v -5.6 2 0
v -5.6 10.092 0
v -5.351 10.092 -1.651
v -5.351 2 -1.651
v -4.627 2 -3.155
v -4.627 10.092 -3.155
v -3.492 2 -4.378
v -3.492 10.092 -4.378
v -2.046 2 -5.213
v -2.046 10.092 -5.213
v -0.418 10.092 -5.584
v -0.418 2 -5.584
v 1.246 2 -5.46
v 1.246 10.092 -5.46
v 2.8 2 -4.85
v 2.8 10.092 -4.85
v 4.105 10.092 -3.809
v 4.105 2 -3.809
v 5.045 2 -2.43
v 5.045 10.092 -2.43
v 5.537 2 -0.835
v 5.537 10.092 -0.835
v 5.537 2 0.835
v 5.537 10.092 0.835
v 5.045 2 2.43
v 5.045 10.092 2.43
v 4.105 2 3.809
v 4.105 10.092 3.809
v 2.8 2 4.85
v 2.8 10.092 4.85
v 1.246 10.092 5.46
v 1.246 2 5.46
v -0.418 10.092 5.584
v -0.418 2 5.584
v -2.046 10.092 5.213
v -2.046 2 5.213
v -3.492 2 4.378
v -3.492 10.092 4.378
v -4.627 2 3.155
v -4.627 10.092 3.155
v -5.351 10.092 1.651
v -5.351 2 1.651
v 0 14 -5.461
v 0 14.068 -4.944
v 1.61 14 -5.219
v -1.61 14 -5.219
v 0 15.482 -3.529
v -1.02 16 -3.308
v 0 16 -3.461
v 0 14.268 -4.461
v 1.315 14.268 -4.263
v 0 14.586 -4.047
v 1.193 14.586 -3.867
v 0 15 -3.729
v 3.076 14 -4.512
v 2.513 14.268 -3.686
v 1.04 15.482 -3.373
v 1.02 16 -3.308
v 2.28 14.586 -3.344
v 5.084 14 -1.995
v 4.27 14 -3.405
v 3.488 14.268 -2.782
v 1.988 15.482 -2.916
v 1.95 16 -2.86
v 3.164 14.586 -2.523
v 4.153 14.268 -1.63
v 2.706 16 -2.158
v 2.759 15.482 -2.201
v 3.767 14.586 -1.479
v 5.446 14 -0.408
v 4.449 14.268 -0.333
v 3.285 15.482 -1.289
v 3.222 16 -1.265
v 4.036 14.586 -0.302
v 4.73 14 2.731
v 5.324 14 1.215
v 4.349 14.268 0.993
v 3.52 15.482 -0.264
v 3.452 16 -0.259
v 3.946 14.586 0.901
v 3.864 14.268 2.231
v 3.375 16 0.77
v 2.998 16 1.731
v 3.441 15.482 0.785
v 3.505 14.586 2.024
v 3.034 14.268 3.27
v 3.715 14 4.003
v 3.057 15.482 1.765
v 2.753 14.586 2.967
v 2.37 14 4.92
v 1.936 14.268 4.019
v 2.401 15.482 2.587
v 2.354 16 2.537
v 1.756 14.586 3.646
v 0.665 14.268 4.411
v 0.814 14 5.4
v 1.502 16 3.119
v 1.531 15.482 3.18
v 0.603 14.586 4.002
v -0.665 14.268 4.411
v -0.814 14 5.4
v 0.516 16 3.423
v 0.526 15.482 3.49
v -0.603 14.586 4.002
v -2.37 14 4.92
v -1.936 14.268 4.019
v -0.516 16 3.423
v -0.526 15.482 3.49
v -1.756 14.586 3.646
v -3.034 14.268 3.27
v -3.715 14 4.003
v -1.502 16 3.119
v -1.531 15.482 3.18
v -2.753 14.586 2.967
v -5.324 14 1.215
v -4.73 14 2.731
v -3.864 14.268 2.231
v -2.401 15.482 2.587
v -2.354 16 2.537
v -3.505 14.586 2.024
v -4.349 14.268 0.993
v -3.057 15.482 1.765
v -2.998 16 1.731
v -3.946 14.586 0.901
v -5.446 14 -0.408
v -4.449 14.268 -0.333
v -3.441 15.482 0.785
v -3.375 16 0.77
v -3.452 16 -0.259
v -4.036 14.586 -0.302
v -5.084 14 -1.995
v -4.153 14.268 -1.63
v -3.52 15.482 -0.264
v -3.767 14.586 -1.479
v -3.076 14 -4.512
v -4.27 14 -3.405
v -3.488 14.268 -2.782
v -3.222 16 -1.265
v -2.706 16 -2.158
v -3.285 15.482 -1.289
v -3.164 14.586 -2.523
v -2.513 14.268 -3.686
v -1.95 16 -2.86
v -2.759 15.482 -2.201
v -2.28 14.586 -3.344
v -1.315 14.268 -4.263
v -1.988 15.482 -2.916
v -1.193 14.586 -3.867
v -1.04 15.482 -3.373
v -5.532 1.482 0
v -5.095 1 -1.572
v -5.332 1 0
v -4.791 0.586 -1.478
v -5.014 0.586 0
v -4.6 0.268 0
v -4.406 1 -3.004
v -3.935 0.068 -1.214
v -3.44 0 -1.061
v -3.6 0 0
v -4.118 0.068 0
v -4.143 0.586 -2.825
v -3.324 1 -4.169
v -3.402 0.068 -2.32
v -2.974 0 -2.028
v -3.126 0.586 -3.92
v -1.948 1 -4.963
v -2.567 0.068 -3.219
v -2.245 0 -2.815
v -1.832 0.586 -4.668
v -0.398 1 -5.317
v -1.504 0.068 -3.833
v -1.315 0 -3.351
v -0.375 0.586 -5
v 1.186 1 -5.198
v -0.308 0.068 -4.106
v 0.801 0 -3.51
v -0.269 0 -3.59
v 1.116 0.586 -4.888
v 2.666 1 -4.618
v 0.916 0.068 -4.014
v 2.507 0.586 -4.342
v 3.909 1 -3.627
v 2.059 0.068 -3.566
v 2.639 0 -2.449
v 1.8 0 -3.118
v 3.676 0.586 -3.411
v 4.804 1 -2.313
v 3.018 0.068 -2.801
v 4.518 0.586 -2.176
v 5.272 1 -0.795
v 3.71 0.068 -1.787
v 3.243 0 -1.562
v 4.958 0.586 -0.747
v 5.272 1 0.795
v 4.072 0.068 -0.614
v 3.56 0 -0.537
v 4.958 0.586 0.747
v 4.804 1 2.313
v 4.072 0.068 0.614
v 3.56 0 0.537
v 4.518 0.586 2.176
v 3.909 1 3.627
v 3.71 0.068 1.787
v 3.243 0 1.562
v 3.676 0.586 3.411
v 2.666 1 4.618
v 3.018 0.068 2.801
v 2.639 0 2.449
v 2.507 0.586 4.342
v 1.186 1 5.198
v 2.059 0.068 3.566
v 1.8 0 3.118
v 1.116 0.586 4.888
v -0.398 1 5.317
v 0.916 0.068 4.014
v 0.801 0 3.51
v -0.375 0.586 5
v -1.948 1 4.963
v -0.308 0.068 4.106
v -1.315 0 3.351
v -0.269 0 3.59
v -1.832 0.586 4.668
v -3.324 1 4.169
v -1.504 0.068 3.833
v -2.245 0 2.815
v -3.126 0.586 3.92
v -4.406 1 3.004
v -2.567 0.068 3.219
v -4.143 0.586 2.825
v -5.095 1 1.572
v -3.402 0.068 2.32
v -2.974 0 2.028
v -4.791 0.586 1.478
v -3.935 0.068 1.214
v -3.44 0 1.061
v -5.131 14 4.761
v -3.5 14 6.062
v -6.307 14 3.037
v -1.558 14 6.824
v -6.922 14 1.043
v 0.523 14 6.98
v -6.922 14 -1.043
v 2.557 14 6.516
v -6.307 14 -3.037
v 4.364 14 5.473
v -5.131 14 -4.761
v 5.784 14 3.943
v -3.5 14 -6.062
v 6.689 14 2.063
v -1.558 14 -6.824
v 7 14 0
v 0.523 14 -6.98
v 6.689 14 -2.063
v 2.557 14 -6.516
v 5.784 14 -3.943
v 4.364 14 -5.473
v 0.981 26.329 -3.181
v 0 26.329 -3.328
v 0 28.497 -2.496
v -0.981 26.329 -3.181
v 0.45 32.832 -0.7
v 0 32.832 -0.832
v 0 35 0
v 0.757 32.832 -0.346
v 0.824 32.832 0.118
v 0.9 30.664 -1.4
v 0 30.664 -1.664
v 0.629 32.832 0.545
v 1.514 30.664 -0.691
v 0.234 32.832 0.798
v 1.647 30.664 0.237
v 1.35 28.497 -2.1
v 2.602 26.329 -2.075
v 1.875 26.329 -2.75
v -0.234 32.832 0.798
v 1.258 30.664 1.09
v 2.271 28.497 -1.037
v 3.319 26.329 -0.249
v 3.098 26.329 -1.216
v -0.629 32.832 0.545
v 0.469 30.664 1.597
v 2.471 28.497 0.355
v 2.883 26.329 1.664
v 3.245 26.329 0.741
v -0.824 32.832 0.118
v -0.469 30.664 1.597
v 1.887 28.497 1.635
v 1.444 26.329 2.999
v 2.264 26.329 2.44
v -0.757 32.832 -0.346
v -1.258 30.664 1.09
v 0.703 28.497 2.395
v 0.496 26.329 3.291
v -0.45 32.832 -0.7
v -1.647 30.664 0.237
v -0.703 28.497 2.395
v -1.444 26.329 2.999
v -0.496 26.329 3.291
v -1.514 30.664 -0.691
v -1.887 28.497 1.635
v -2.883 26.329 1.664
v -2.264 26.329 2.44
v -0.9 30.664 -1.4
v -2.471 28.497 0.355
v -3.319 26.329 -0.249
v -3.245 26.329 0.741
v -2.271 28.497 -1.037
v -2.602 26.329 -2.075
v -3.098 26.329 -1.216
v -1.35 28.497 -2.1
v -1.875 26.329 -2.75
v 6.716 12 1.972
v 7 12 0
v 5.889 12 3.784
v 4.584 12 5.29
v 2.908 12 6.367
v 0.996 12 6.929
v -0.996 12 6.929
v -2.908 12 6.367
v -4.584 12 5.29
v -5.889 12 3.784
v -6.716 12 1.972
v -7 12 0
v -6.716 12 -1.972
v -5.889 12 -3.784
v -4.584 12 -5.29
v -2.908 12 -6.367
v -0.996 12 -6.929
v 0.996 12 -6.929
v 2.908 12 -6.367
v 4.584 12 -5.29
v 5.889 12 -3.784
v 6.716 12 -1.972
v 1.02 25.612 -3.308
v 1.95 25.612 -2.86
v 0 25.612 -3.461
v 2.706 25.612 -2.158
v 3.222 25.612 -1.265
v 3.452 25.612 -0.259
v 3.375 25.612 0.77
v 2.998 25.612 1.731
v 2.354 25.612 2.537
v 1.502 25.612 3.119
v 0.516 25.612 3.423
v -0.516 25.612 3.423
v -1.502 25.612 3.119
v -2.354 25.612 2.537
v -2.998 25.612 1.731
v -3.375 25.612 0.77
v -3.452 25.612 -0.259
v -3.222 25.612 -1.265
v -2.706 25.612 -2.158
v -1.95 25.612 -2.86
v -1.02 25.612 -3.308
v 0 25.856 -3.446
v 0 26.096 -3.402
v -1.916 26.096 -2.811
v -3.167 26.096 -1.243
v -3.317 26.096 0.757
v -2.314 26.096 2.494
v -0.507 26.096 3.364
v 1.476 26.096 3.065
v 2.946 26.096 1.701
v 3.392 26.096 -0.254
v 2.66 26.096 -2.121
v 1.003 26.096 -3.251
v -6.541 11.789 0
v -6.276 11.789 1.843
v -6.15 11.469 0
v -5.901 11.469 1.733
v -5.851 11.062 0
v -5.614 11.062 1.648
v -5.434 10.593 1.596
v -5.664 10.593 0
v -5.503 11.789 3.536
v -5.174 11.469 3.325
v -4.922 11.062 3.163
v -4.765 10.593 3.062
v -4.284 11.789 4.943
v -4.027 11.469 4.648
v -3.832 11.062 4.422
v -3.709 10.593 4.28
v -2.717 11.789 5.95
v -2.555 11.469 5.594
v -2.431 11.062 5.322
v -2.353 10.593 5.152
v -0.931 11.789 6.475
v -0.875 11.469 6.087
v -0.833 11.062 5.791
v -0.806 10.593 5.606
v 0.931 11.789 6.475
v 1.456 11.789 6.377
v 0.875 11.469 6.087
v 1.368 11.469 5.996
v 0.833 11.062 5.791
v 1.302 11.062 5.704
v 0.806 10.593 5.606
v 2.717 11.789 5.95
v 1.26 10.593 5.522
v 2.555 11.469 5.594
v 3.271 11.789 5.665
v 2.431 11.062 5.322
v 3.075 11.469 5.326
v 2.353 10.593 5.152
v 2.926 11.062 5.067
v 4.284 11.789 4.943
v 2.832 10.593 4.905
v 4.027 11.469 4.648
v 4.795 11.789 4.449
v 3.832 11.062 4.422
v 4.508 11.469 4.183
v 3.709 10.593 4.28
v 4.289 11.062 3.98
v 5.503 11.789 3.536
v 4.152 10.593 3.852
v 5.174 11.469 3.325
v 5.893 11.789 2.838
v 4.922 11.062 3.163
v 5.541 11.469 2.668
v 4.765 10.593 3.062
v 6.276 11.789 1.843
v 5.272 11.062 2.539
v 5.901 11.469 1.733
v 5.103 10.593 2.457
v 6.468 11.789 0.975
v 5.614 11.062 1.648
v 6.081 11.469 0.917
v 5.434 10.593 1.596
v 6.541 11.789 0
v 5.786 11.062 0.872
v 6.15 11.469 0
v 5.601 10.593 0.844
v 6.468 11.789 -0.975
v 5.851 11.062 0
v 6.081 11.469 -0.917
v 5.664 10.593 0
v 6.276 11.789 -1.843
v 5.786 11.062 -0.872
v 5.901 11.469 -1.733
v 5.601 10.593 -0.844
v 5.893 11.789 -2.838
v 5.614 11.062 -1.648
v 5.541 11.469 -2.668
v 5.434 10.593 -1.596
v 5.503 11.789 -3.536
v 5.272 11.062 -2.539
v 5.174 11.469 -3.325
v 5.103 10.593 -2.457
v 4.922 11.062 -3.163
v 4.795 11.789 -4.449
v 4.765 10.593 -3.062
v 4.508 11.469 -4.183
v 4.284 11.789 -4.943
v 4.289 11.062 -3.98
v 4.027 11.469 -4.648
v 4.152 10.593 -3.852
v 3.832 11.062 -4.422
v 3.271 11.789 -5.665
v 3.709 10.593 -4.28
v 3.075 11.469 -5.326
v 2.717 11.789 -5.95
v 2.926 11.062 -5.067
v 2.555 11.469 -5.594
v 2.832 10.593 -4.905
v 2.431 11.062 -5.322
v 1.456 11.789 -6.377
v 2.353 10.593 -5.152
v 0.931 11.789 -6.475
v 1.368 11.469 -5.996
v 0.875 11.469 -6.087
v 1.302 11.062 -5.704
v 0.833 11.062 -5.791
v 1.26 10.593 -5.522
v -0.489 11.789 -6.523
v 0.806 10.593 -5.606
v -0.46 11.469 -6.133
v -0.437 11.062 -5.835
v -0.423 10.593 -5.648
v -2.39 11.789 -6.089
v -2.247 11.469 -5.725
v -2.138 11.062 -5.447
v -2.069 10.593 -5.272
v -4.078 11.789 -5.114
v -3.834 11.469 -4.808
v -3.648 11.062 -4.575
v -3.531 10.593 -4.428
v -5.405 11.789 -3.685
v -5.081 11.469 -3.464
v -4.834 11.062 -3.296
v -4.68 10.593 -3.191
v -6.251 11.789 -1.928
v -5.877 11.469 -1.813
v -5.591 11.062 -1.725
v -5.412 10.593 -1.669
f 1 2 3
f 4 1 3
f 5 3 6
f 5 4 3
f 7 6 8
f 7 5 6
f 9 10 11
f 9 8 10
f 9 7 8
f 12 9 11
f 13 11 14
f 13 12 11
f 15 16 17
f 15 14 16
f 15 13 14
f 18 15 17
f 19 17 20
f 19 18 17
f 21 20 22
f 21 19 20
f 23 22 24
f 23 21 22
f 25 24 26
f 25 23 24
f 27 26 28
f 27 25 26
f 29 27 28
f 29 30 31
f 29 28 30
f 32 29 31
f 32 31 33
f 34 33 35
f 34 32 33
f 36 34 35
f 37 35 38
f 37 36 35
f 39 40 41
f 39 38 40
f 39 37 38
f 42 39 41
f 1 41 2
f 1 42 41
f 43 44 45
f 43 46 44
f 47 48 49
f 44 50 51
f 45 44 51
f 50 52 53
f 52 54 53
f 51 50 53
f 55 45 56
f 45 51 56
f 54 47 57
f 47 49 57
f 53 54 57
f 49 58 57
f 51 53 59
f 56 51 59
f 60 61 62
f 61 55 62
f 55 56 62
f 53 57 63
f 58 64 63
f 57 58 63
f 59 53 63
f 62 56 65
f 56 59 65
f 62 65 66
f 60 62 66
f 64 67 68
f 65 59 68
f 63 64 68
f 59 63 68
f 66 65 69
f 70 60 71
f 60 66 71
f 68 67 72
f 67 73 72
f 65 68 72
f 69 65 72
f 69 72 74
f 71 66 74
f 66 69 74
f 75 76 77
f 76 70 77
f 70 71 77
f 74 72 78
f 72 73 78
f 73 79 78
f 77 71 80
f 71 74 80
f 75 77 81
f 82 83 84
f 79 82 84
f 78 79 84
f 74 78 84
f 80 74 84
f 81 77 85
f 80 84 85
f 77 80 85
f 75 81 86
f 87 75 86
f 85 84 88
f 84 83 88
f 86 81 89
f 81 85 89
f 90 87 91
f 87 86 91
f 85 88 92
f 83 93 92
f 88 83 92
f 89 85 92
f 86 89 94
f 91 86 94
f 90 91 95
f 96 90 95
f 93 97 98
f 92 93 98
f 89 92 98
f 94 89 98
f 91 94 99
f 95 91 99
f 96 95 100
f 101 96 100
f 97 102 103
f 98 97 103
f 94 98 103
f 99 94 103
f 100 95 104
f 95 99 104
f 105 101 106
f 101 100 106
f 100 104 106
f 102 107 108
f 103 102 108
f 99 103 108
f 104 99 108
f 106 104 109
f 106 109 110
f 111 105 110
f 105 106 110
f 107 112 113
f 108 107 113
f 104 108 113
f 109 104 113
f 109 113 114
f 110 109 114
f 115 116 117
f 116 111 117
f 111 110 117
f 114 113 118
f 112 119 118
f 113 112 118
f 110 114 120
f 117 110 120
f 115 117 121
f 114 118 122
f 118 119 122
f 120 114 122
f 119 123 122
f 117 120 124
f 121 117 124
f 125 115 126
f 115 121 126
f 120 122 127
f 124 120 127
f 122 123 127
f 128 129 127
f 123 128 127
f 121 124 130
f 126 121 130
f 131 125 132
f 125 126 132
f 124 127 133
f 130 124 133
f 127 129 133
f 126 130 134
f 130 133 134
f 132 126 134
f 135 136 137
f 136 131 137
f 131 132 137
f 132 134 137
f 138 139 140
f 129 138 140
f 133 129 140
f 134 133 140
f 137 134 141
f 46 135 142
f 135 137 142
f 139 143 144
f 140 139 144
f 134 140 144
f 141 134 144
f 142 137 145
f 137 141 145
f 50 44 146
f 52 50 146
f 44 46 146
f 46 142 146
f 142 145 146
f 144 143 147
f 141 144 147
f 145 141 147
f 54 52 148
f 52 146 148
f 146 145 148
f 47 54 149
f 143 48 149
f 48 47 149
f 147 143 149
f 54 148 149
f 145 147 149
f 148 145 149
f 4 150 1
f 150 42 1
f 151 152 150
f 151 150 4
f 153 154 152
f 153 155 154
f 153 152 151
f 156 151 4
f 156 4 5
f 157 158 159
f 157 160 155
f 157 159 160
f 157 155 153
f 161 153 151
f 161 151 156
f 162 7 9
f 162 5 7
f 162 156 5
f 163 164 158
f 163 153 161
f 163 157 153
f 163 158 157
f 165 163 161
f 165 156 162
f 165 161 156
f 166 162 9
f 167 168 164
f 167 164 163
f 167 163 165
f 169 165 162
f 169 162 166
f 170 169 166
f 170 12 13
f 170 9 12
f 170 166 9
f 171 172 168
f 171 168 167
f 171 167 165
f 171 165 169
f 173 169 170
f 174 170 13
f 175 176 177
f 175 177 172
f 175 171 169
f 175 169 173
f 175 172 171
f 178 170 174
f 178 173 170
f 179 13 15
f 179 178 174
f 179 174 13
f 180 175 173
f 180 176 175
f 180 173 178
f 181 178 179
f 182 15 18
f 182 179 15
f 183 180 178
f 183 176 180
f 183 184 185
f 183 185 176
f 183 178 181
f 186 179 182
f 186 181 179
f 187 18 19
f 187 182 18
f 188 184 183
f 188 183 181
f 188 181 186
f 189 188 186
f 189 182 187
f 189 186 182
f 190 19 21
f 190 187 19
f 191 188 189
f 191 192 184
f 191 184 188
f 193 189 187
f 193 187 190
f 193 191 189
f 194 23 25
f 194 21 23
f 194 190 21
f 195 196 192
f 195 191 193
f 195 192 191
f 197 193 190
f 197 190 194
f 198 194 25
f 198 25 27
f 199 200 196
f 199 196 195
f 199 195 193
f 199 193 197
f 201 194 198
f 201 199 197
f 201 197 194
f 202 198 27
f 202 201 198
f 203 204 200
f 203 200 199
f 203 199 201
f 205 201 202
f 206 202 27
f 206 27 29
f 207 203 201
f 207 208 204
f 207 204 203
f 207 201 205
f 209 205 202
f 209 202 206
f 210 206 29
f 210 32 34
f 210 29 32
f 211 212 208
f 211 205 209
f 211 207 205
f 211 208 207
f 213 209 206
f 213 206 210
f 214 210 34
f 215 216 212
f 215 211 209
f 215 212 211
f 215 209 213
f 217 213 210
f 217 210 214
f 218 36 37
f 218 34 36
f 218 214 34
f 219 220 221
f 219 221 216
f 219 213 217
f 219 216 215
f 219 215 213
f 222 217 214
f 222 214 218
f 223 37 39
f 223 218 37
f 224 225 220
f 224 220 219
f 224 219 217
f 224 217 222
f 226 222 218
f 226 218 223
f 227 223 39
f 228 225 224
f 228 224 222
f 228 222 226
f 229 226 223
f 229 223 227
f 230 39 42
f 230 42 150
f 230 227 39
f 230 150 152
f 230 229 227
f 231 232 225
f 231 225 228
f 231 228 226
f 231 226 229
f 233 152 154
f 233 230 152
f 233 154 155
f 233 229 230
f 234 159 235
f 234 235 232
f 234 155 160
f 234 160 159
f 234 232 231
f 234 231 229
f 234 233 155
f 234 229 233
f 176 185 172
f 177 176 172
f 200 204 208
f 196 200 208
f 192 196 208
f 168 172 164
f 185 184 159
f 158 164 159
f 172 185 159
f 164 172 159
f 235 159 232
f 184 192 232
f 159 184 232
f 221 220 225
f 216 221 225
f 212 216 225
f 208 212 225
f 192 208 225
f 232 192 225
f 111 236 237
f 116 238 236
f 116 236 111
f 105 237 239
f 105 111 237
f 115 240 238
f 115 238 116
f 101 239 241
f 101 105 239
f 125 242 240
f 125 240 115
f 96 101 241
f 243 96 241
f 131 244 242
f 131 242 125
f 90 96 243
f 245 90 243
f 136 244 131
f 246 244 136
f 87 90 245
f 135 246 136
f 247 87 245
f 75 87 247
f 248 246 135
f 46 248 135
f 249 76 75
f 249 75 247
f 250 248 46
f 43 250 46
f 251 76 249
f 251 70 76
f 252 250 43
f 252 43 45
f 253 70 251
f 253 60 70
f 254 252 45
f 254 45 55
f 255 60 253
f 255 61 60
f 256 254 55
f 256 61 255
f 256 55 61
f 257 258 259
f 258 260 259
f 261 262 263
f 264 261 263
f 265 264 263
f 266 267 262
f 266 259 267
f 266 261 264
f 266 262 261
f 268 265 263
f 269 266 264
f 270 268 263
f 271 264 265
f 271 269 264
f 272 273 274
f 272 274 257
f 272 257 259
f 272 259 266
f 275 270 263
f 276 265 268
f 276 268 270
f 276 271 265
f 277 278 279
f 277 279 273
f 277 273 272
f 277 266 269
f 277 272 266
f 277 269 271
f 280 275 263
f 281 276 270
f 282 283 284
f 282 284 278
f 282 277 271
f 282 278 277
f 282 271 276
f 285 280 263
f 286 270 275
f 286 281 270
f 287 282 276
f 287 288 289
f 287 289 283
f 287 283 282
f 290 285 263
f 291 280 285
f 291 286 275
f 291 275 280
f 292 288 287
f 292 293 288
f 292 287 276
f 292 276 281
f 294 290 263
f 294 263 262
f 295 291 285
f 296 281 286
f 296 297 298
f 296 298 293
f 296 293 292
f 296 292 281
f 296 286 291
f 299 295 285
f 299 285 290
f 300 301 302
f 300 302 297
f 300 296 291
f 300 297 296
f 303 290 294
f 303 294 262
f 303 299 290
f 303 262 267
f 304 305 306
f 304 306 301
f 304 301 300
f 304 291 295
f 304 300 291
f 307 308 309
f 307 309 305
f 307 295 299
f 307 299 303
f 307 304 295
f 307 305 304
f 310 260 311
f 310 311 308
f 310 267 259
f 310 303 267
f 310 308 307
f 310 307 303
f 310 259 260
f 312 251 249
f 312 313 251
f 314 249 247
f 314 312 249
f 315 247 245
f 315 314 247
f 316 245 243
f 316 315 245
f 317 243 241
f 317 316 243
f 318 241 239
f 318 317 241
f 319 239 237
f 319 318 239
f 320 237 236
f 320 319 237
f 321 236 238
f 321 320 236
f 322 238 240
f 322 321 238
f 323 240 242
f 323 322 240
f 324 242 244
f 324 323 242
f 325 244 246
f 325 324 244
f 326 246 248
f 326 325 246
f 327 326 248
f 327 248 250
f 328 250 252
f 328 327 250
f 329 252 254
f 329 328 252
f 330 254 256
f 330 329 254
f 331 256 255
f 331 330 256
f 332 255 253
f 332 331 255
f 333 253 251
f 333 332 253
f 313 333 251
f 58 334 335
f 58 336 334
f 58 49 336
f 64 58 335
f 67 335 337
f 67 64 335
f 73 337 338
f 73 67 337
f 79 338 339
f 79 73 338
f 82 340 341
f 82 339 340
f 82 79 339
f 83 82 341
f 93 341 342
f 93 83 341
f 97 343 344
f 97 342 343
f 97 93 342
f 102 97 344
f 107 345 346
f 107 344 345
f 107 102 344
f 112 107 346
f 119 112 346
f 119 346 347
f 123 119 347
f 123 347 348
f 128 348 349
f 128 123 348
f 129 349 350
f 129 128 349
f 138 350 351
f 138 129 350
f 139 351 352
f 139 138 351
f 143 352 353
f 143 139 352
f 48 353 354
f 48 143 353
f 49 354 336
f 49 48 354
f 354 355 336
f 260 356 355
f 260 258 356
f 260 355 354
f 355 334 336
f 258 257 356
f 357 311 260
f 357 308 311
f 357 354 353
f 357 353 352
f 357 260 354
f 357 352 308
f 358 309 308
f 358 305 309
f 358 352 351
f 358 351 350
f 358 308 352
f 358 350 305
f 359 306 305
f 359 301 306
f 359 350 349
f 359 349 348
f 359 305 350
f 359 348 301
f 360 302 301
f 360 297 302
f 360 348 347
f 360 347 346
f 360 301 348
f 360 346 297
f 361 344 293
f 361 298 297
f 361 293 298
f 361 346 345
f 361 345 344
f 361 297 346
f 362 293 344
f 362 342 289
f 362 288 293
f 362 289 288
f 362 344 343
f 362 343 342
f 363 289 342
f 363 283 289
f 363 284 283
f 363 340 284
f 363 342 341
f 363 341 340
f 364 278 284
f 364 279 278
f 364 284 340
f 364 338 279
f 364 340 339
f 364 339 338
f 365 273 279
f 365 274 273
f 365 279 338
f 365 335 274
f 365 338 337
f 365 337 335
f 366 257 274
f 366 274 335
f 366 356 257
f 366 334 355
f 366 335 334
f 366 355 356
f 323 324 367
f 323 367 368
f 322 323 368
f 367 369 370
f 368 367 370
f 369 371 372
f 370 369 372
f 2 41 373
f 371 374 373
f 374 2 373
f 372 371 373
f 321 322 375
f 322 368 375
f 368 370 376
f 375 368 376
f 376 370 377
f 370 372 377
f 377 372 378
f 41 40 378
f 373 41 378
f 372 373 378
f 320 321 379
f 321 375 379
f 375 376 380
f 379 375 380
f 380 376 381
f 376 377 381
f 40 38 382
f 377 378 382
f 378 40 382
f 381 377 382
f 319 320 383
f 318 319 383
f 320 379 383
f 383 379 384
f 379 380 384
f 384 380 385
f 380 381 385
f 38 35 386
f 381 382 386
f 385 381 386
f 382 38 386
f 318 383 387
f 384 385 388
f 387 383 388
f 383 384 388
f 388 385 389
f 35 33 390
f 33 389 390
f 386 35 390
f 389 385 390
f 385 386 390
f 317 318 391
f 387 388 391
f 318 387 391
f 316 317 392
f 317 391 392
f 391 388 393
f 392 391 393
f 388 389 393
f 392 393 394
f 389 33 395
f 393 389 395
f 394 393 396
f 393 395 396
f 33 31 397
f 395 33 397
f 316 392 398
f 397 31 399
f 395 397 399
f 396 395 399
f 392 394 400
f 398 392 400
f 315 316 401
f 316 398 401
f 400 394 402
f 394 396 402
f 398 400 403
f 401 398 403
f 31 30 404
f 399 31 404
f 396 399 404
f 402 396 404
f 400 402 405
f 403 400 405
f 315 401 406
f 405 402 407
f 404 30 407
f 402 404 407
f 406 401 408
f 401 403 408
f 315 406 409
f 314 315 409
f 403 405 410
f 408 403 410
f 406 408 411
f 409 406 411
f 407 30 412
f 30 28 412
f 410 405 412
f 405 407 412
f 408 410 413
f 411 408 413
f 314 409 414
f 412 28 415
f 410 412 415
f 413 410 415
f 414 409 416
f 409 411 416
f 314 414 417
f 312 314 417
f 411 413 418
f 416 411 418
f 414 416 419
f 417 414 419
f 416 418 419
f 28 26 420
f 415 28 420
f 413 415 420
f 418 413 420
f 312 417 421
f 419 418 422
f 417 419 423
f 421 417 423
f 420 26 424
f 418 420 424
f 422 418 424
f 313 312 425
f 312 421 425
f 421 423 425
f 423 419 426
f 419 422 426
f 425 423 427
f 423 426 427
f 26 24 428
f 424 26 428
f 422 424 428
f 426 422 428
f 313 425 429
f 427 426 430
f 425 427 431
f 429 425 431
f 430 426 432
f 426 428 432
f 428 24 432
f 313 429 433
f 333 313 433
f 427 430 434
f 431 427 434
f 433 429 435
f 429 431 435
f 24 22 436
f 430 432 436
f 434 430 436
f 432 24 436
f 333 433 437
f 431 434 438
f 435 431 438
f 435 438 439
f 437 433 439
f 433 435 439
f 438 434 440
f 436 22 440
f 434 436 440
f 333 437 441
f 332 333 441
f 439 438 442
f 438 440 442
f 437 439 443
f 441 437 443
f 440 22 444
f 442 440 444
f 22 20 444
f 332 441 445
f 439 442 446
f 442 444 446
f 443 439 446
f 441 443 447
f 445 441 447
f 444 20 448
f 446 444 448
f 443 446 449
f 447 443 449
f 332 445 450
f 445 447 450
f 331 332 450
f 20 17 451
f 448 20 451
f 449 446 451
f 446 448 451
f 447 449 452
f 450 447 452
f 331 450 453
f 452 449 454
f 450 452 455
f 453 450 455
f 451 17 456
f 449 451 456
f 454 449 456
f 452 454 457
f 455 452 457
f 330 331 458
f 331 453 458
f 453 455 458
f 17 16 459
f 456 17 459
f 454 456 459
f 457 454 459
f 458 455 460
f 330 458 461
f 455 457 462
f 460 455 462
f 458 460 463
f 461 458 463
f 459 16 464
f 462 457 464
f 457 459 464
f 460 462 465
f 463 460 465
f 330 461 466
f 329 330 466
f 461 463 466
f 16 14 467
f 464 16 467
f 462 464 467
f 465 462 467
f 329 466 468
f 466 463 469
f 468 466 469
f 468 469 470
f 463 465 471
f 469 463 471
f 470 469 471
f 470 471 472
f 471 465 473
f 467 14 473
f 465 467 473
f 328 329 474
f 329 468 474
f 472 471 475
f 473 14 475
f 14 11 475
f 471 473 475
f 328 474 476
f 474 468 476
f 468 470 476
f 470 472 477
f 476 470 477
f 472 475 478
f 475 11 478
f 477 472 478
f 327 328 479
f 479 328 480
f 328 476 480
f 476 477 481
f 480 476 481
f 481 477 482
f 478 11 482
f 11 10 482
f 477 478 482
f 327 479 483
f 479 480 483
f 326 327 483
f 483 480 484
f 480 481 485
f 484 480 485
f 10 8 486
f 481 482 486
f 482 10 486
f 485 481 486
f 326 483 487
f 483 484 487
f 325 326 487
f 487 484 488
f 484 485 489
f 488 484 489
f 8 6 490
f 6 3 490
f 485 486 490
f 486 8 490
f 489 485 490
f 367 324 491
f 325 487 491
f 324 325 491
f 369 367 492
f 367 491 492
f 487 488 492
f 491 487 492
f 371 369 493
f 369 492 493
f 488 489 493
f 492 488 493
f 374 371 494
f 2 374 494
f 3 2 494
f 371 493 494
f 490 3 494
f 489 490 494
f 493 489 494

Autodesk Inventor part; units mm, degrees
ref_plane "YZ Plane" through (0, 0, 0) normal (1, 0, 0) x (0, 1, 0)
ref_plane "XZ Plane" through (0, 0, 0) normal (0, 1, 0) x (-1, 0, 0)
ref_plane "XY Plane" through (0, 0, 0) normal (0, 0, 1) x (1, 0, 0)
sketch "Sketch1" plane through (0, 0, 0) normal (0, 1, 0) x (-1, 0, 0)
  circle A0 centre (0, 0) radius 5.6
  dimension "d0" = 11.2
extrude "Extrusion1" add sketch "Sketch1" along normal blind 12
fillet "Fillet1" radius 2 1 edges at (5.6, 0, 0)
sketch "Sketch2" plane through (0, 12, 0) normal (0, 1, 0) x (1, 0, 0)
  circle A0 centre (0, 0) radius 7
  dimension "d4" = 14
extrude "Extrusion2" add sketch "Sketch2" along normal blind 2
sketch "Sketch3" plane through (0, 0, 0) normal (1, 0, 0) x (0, 1, 0)
  line L0 (14, -7) -> (14, 7) projected
  line L1 (12, -7) -> (12, 7) projected
  line L2 (14, 0) -> (35, 0)
  line L3 (35, 0) -> (25.9829, -3.4613)
  line L4 (25.9829, -3.4613) -> (14, -3.4613)
  point P0 (0, 0)
  dimension "d7" = 21
  dimension "d8" = 21
revolve "Revolution1" add sketch "Sketch3" angle 360 about axis through (0, 14, 0) along (0, 1, 0)
fillet "Fillet2" radius 2 3 edges at (5.6, 12, 0) (0, 14, 3.4613) (0, 25.9829, 3.4613)
properties part number "Punta calibración 2_3DPrint"
